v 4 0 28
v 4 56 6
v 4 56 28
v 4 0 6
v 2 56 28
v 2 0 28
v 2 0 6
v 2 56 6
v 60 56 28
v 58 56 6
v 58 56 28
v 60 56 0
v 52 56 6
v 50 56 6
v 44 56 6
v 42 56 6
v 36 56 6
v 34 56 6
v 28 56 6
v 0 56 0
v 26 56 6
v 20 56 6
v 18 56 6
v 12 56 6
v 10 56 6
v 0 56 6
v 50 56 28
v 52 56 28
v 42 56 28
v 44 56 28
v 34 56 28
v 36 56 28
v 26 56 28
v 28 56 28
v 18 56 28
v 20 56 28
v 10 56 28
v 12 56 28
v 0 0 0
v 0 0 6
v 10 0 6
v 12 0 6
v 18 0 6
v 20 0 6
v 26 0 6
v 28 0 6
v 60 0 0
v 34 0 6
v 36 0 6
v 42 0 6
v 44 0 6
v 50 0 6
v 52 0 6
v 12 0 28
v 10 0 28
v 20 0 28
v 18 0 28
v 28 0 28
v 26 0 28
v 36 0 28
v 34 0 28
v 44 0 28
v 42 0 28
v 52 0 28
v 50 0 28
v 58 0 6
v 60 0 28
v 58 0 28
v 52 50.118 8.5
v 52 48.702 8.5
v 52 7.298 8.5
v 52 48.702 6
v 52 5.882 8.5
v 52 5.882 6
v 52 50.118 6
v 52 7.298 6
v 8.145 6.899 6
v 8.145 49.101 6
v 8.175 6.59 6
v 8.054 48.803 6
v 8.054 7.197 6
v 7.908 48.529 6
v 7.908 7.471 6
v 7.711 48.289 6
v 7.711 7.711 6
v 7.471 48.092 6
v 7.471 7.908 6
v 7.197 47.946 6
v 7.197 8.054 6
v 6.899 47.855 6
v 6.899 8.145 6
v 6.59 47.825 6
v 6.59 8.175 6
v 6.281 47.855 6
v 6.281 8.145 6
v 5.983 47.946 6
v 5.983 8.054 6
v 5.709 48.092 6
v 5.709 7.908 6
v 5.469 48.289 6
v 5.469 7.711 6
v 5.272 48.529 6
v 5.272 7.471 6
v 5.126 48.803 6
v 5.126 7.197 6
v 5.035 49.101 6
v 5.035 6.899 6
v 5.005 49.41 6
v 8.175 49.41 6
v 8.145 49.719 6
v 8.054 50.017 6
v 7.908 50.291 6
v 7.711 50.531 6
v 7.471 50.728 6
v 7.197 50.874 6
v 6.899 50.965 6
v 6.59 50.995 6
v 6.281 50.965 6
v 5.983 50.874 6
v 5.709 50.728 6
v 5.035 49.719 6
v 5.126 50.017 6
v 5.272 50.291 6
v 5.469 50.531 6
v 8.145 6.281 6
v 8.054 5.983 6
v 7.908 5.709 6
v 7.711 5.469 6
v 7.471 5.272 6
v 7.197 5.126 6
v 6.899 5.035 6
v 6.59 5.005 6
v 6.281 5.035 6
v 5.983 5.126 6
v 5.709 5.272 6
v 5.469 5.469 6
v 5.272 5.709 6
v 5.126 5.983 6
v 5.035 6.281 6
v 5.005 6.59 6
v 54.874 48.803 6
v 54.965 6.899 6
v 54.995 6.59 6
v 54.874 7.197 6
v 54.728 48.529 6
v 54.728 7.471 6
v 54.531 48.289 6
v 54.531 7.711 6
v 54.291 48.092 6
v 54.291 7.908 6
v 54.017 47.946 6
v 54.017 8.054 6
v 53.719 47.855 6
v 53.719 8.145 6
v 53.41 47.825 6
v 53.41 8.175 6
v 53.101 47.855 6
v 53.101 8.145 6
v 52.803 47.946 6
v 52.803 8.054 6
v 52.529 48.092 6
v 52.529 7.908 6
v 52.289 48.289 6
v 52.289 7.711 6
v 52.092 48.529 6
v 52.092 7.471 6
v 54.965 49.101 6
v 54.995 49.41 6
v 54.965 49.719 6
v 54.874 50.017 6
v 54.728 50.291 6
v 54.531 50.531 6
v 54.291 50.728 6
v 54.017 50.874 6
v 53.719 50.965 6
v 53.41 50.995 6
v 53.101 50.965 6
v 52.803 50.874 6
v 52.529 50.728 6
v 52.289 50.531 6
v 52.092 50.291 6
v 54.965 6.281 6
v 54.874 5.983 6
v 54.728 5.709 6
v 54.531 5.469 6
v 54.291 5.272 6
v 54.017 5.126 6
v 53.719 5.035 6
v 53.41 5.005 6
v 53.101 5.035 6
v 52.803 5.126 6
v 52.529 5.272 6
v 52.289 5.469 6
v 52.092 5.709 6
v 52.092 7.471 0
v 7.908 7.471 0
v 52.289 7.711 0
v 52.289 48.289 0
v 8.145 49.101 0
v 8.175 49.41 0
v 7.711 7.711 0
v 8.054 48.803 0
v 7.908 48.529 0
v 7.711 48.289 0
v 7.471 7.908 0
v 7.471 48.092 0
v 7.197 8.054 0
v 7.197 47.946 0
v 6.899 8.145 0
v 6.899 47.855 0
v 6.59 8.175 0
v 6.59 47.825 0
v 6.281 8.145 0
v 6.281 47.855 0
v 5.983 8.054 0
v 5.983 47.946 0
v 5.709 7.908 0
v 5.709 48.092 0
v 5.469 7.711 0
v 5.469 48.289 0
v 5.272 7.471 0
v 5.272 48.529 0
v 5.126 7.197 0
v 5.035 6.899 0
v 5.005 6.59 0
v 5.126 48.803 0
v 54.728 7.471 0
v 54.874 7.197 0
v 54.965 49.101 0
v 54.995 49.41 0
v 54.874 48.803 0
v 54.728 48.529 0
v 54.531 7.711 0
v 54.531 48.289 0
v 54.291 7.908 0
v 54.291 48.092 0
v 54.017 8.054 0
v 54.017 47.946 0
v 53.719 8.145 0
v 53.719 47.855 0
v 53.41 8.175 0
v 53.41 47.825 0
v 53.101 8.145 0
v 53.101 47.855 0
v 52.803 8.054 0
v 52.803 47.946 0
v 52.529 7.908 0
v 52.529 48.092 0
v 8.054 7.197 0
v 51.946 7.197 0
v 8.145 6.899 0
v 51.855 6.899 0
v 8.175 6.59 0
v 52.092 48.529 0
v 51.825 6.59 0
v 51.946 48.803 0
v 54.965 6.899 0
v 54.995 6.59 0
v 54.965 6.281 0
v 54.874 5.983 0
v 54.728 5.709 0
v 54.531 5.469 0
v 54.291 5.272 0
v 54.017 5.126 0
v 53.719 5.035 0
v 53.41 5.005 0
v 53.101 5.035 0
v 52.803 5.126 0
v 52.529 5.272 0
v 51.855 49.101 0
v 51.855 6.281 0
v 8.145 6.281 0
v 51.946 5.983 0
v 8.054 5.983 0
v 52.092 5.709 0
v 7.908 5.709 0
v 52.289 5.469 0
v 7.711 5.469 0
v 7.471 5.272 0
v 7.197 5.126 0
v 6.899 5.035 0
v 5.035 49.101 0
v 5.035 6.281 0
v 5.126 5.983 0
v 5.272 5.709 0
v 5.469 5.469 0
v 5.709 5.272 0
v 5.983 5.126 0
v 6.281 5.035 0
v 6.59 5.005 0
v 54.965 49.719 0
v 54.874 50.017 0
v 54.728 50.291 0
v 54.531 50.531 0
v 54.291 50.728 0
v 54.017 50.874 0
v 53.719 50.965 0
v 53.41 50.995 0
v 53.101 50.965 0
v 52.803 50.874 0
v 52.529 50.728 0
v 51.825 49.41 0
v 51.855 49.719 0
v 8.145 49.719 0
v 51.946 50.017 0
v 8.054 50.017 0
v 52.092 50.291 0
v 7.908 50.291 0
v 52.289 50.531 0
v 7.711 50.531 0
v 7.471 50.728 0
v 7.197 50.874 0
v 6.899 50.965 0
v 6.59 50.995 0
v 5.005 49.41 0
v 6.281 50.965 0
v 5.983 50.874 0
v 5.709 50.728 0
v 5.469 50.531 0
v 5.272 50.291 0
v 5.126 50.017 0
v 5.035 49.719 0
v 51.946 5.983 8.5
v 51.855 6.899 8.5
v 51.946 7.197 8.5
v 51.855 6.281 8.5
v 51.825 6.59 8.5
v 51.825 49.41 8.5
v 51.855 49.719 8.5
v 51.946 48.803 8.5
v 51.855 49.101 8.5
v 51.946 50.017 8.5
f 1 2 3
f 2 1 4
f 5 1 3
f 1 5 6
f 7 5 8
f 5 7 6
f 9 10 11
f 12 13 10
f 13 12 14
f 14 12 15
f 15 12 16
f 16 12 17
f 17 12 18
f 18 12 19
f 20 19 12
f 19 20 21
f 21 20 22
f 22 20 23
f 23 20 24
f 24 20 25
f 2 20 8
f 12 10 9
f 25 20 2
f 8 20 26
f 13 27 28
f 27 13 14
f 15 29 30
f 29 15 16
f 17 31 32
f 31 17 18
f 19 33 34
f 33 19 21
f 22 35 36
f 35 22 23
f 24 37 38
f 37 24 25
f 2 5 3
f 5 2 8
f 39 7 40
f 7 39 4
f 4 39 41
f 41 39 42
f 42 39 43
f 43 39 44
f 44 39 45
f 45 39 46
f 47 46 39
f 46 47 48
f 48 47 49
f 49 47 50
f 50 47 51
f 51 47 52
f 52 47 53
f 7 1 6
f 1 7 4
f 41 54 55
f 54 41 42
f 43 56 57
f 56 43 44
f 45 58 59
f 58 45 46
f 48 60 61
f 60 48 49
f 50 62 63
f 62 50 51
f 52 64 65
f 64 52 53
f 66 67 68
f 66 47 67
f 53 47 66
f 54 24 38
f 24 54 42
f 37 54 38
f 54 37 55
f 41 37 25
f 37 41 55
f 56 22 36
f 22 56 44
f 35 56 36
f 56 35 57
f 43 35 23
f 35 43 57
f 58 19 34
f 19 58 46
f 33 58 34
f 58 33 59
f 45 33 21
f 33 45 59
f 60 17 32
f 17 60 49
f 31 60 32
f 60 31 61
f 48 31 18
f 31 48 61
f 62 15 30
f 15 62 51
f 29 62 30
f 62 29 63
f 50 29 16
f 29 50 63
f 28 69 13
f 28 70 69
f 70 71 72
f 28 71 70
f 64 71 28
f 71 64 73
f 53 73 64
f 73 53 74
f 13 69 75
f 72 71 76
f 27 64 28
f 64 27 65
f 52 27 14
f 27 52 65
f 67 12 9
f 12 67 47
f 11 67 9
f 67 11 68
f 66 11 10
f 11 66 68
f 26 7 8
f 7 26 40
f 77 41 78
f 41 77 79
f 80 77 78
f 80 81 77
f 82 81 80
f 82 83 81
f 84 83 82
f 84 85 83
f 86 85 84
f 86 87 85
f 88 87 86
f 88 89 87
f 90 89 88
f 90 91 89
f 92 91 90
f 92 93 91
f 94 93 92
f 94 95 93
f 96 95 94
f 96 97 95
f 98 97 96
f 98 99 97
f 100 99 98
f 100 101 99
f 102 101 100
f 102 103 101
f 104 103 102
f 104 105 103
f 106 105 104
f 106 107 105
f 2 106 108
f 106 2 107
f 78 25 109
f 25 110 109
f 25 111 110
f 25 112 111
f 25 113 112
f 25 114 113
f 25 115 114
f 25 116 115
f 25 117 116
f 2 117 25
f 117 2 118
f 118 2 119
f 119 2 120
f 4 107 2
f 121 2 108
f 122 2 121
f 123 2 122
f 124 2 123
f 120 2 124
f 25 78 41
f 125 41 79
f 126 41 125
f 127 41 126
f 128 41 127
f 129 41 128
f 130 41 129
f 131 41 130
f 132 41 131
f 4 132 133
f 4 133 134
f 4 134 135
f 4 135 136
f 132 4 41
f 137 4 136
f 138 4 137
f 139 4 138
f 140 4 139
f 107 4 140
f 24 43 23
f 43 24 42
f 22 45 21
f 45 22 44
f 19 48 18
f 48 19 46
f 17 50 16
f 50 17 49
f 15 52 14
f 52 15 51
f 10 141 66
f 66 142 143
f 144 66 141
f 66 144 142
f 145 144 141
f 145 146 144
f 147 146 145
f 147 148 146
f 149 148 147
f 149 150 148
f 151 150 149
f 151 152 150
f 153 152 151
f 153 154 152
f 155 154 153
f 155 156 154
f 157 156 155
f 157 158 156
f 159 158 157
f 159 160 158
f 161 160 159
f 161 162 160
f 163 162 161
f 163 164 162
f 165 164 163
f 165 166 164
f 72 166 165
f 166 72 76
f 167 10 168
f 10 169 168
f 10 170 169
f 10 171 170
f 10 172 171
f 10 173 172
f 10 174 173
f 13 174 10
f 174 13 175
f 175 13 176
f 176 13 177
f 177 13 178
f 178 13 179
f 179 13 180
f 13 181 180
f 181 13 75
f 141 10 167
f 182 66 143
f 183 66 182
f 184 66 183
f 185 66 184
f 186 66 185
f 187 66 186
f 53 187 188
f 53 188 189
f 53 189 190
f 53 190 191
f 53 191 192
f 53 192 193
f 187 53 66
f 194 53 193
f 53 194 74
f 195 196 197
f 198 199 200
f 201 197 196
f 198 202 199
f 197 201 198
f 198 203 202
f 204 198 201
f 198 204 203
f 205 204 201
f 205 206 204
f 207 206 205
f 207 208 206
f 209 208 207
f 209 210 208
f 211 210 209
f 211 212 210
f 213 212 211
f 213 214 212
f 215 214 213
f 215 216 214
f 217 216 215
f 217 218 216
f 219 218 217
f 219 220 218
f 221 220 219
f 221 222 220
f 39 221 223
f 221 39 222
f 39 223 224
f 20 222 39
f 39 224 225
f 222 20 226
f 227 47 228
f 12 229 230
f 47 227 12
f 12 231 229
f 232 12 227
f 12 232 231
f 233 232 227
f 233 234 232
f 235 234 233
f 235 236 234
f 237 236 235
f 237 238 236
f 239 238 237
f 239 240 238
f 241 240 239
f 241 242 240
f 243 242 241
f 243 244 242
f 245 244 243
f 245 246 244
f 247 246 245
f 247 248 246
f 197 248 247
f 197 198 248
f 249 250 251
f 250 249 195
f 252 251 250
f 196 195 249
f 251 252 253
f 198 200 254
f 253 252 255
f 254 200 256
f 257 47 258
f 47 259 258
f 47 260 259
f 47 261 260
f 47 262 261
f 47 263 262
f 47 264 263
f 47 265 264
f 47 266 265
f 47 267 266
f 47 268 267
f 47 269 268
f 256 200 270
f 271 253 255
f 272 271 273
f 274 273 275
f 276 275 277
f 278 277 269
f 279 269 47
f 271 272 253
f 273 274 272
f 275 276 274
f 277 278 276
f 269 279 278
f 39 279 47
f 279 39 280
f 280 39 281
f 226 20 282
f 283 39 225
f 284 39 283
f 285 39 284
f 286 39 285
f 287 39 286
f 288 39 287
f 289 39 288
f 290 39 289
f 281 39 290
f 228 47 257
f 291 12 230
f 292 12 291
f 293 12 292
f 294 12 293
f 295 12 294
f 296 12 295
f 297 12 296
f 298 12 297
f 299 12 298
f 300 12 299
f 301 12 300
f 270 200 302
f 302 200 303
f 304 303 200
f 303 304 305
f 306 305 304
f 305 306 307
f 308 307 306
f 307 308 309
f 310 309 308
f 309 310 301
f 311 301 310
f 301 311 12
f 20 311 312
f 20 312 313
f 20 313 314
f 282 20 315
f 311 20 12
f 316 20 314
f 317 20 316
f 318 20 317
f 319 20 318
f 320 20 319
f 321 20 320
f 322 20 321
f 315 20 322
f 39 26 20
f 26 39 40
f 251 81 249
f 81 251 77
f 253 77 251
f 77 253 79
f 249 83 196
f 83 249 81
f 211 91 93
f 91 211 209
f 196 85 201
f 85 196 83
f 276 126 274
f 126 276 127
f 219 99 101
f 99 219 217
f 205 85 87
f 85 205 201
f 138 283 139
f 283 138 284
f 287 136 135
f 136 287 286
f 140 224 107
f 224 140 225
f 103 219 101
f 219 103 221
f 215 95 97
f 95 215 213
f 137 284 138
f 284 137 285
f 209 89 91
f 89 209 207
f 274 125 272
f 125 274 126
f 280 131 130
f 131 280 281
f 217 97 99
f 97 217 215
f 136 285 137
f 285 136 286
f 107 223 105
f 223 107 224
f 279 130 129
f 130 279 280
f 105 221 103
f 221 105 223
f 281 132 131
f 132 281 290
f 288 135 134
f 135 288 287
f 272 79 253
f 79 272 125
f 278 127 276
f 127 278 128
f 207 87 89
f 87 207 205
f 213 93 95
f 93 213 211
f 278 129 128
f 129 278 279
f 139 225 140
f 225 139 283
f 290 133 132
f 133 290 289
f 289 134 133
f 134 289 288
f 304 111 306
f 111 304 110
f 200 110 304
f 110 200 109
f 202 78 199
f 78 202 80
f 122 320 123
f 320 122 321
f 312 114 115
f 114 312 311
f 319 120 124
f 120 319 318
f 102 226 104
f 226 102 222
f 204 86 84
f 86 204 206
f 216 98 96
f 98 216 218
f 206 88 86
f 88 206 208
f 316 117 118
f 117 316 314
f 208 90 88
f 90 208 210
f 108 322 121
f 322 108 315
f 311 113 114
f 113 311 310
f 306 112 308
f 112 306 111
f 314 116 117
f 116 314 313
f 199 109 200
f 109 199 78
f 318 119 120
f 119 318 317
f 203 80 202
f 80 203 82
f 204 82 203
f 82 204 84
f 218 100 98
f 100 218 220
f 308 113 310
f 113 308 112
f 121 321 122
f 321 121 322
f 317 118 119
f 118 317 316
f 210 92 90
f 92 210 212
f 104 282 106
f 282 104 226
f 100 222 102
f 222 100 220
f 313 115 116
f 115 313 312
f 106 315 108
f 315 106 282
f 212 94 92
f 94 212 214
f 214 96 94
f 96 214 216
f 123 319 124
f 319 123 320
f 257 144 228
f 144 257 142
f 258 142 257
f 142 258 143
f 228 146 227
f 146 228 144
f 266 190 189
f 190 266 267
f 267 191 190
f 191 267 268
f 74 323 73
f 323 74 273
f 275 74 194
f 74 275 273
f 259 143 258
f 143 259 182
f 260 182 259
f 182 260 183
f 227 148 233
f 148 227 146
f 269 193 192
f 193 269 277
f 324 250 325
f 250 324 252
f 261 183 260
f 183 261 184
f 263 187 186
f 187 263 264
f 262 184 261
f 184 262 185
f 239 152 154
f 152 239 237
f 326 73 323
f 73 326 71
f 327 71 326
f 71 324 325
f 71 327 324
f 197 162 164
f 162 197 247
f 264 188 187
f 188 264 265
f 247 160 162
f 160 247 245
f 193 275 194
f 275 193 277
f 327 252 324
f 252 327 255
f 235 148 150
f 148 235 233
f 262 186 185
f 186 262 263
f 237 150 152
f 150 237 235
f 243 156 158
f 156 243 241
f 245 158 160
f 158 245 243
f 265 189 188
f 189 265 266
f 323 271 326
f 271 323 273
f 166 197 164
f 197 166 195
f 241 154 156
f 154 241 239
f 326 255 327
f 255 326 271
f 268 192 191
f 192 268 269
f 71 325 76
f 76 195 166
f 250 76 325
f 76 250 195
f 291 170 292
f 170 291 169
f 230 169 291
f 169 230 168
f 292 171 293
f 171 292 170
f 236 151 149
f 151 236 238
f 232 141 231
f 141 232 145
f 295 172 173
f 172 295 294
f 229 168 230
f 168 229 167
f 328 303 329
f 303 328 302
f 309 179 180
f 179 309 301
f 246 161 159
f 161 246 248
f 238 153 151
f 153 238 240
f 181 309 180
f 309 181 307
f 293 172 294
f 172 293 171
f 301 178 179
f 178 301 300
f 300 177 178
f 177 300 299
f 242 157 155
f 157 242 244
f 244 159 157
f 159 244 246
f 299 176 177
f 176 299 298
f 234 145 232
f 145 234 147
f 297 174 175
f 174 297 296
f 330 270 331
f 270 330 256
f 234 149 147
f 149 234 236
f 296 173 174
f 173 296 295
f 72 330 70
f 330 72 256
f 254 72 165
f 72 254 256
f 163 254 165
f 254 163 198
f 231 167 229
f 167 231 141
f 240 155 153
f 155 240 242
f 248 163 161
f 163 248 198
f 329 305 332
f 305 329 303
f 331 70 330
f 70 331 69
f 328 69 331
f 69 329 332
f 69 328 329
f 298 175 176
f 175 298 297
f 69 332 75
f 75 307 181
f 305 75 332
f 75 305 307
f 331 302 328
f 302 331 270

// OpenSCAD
$fn = 32;

// ----------------------------------------------------------------------
// Finned heat sink: 60 x 56 mm base, 22 mm fins
// ----------------------------------------------------------------------

// --- parameters (mm) ---
base_w = 60;              // base width
base_d = 56;              // base depth
base_t = 6;               // base thickness
fin_h = 22;               // fin height above the base
holes_d = 3.17;           // fixing holes
hole_x = 23.41;           // hole offset in x
hole_y = 21.41;           // hole offset in y
fin_t = 2;                // fin thickness
fin_pitch = 8;            // fin pitch
fin_count = 8;            // number of fins
fin_x0 = 2;               // first fin offset

difference() {
  union() {
    cube([base_w, base_d, base_t]);
    for (i = [0 : fin_count - 1]) {
      translate([fin_x0 + i * fin_pitch, 0, base_t - 0.5]) cube([fin_t, base_d, fin_h + 0.5]);
    }
  }
  /* fixing holes through the base, 2.5 mm clear on both sides */
  for (hx = [-23.41, 23.41]) {
    for (hy = [-21.41, 21.41]) {
      translate([base_w / 2 + hx, base_d / 2 + hy, -2.5]) cylinder(h = base_t + 5, d = holes_d);
    }
  }
}
